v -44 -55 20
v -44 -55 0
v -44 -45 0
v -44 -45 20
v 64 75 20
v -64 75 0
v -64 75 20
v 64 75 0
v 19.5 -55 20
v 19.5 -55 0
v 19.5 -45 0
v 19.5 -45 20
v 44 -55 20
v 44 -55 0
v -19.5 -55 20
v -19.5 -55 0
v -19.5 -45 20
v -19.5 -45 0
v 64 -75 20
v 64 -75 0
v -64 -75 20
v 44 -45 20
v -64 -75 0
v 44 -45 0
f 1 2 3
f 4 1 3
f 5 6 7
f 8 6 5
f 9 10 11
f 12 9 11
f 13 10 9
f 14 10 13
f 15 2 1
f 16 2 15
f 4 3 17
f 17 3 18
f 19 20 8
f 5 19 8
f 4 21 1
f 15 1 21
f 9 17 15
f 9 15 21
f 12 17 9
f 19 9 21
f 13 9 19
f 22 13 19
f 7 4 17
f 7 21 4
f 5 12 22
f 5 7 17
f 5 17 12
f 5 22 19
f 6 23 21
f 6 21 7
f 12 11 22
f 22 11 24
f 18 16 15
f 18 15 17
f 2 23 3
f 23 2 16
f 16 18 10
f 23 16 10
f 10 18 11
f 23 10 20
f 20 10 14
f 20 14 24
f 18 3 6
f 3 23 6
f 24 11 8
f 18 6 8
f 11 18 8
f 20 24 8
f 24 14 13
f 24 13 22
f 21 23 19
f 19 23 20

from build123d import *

# Parameters (mm, degrees)
SKETCH2_W           = 128
SKETCH2_H           = 150
SKETCH2_W_2         = 24.5
SKETCH2_H_2         = 10
BOSS_EXTRUDE1_DEPTH = 20


with BuildPart() as part:
    # Sketch2 → Boss-Extrude1 (new body)
    with BuildSketch(Plane.XY):
        Rectangle(SKETCH2_W, SKETCH2_H)
        with Locations((-31.75, -50)):
            Rectangle(SKETCH2_W_2, SKETCH2_H_2, mode=Mode.SUBTRACT)
        with Locations((31.75, -50)):
            Rectangle(SKETCH2_W_2, SKETCH2_H_2, mode=Mode.SUBTRACT)
    extrude(amount=BOSS_EXTRUDE1_DEPTH)


solid = part.part
